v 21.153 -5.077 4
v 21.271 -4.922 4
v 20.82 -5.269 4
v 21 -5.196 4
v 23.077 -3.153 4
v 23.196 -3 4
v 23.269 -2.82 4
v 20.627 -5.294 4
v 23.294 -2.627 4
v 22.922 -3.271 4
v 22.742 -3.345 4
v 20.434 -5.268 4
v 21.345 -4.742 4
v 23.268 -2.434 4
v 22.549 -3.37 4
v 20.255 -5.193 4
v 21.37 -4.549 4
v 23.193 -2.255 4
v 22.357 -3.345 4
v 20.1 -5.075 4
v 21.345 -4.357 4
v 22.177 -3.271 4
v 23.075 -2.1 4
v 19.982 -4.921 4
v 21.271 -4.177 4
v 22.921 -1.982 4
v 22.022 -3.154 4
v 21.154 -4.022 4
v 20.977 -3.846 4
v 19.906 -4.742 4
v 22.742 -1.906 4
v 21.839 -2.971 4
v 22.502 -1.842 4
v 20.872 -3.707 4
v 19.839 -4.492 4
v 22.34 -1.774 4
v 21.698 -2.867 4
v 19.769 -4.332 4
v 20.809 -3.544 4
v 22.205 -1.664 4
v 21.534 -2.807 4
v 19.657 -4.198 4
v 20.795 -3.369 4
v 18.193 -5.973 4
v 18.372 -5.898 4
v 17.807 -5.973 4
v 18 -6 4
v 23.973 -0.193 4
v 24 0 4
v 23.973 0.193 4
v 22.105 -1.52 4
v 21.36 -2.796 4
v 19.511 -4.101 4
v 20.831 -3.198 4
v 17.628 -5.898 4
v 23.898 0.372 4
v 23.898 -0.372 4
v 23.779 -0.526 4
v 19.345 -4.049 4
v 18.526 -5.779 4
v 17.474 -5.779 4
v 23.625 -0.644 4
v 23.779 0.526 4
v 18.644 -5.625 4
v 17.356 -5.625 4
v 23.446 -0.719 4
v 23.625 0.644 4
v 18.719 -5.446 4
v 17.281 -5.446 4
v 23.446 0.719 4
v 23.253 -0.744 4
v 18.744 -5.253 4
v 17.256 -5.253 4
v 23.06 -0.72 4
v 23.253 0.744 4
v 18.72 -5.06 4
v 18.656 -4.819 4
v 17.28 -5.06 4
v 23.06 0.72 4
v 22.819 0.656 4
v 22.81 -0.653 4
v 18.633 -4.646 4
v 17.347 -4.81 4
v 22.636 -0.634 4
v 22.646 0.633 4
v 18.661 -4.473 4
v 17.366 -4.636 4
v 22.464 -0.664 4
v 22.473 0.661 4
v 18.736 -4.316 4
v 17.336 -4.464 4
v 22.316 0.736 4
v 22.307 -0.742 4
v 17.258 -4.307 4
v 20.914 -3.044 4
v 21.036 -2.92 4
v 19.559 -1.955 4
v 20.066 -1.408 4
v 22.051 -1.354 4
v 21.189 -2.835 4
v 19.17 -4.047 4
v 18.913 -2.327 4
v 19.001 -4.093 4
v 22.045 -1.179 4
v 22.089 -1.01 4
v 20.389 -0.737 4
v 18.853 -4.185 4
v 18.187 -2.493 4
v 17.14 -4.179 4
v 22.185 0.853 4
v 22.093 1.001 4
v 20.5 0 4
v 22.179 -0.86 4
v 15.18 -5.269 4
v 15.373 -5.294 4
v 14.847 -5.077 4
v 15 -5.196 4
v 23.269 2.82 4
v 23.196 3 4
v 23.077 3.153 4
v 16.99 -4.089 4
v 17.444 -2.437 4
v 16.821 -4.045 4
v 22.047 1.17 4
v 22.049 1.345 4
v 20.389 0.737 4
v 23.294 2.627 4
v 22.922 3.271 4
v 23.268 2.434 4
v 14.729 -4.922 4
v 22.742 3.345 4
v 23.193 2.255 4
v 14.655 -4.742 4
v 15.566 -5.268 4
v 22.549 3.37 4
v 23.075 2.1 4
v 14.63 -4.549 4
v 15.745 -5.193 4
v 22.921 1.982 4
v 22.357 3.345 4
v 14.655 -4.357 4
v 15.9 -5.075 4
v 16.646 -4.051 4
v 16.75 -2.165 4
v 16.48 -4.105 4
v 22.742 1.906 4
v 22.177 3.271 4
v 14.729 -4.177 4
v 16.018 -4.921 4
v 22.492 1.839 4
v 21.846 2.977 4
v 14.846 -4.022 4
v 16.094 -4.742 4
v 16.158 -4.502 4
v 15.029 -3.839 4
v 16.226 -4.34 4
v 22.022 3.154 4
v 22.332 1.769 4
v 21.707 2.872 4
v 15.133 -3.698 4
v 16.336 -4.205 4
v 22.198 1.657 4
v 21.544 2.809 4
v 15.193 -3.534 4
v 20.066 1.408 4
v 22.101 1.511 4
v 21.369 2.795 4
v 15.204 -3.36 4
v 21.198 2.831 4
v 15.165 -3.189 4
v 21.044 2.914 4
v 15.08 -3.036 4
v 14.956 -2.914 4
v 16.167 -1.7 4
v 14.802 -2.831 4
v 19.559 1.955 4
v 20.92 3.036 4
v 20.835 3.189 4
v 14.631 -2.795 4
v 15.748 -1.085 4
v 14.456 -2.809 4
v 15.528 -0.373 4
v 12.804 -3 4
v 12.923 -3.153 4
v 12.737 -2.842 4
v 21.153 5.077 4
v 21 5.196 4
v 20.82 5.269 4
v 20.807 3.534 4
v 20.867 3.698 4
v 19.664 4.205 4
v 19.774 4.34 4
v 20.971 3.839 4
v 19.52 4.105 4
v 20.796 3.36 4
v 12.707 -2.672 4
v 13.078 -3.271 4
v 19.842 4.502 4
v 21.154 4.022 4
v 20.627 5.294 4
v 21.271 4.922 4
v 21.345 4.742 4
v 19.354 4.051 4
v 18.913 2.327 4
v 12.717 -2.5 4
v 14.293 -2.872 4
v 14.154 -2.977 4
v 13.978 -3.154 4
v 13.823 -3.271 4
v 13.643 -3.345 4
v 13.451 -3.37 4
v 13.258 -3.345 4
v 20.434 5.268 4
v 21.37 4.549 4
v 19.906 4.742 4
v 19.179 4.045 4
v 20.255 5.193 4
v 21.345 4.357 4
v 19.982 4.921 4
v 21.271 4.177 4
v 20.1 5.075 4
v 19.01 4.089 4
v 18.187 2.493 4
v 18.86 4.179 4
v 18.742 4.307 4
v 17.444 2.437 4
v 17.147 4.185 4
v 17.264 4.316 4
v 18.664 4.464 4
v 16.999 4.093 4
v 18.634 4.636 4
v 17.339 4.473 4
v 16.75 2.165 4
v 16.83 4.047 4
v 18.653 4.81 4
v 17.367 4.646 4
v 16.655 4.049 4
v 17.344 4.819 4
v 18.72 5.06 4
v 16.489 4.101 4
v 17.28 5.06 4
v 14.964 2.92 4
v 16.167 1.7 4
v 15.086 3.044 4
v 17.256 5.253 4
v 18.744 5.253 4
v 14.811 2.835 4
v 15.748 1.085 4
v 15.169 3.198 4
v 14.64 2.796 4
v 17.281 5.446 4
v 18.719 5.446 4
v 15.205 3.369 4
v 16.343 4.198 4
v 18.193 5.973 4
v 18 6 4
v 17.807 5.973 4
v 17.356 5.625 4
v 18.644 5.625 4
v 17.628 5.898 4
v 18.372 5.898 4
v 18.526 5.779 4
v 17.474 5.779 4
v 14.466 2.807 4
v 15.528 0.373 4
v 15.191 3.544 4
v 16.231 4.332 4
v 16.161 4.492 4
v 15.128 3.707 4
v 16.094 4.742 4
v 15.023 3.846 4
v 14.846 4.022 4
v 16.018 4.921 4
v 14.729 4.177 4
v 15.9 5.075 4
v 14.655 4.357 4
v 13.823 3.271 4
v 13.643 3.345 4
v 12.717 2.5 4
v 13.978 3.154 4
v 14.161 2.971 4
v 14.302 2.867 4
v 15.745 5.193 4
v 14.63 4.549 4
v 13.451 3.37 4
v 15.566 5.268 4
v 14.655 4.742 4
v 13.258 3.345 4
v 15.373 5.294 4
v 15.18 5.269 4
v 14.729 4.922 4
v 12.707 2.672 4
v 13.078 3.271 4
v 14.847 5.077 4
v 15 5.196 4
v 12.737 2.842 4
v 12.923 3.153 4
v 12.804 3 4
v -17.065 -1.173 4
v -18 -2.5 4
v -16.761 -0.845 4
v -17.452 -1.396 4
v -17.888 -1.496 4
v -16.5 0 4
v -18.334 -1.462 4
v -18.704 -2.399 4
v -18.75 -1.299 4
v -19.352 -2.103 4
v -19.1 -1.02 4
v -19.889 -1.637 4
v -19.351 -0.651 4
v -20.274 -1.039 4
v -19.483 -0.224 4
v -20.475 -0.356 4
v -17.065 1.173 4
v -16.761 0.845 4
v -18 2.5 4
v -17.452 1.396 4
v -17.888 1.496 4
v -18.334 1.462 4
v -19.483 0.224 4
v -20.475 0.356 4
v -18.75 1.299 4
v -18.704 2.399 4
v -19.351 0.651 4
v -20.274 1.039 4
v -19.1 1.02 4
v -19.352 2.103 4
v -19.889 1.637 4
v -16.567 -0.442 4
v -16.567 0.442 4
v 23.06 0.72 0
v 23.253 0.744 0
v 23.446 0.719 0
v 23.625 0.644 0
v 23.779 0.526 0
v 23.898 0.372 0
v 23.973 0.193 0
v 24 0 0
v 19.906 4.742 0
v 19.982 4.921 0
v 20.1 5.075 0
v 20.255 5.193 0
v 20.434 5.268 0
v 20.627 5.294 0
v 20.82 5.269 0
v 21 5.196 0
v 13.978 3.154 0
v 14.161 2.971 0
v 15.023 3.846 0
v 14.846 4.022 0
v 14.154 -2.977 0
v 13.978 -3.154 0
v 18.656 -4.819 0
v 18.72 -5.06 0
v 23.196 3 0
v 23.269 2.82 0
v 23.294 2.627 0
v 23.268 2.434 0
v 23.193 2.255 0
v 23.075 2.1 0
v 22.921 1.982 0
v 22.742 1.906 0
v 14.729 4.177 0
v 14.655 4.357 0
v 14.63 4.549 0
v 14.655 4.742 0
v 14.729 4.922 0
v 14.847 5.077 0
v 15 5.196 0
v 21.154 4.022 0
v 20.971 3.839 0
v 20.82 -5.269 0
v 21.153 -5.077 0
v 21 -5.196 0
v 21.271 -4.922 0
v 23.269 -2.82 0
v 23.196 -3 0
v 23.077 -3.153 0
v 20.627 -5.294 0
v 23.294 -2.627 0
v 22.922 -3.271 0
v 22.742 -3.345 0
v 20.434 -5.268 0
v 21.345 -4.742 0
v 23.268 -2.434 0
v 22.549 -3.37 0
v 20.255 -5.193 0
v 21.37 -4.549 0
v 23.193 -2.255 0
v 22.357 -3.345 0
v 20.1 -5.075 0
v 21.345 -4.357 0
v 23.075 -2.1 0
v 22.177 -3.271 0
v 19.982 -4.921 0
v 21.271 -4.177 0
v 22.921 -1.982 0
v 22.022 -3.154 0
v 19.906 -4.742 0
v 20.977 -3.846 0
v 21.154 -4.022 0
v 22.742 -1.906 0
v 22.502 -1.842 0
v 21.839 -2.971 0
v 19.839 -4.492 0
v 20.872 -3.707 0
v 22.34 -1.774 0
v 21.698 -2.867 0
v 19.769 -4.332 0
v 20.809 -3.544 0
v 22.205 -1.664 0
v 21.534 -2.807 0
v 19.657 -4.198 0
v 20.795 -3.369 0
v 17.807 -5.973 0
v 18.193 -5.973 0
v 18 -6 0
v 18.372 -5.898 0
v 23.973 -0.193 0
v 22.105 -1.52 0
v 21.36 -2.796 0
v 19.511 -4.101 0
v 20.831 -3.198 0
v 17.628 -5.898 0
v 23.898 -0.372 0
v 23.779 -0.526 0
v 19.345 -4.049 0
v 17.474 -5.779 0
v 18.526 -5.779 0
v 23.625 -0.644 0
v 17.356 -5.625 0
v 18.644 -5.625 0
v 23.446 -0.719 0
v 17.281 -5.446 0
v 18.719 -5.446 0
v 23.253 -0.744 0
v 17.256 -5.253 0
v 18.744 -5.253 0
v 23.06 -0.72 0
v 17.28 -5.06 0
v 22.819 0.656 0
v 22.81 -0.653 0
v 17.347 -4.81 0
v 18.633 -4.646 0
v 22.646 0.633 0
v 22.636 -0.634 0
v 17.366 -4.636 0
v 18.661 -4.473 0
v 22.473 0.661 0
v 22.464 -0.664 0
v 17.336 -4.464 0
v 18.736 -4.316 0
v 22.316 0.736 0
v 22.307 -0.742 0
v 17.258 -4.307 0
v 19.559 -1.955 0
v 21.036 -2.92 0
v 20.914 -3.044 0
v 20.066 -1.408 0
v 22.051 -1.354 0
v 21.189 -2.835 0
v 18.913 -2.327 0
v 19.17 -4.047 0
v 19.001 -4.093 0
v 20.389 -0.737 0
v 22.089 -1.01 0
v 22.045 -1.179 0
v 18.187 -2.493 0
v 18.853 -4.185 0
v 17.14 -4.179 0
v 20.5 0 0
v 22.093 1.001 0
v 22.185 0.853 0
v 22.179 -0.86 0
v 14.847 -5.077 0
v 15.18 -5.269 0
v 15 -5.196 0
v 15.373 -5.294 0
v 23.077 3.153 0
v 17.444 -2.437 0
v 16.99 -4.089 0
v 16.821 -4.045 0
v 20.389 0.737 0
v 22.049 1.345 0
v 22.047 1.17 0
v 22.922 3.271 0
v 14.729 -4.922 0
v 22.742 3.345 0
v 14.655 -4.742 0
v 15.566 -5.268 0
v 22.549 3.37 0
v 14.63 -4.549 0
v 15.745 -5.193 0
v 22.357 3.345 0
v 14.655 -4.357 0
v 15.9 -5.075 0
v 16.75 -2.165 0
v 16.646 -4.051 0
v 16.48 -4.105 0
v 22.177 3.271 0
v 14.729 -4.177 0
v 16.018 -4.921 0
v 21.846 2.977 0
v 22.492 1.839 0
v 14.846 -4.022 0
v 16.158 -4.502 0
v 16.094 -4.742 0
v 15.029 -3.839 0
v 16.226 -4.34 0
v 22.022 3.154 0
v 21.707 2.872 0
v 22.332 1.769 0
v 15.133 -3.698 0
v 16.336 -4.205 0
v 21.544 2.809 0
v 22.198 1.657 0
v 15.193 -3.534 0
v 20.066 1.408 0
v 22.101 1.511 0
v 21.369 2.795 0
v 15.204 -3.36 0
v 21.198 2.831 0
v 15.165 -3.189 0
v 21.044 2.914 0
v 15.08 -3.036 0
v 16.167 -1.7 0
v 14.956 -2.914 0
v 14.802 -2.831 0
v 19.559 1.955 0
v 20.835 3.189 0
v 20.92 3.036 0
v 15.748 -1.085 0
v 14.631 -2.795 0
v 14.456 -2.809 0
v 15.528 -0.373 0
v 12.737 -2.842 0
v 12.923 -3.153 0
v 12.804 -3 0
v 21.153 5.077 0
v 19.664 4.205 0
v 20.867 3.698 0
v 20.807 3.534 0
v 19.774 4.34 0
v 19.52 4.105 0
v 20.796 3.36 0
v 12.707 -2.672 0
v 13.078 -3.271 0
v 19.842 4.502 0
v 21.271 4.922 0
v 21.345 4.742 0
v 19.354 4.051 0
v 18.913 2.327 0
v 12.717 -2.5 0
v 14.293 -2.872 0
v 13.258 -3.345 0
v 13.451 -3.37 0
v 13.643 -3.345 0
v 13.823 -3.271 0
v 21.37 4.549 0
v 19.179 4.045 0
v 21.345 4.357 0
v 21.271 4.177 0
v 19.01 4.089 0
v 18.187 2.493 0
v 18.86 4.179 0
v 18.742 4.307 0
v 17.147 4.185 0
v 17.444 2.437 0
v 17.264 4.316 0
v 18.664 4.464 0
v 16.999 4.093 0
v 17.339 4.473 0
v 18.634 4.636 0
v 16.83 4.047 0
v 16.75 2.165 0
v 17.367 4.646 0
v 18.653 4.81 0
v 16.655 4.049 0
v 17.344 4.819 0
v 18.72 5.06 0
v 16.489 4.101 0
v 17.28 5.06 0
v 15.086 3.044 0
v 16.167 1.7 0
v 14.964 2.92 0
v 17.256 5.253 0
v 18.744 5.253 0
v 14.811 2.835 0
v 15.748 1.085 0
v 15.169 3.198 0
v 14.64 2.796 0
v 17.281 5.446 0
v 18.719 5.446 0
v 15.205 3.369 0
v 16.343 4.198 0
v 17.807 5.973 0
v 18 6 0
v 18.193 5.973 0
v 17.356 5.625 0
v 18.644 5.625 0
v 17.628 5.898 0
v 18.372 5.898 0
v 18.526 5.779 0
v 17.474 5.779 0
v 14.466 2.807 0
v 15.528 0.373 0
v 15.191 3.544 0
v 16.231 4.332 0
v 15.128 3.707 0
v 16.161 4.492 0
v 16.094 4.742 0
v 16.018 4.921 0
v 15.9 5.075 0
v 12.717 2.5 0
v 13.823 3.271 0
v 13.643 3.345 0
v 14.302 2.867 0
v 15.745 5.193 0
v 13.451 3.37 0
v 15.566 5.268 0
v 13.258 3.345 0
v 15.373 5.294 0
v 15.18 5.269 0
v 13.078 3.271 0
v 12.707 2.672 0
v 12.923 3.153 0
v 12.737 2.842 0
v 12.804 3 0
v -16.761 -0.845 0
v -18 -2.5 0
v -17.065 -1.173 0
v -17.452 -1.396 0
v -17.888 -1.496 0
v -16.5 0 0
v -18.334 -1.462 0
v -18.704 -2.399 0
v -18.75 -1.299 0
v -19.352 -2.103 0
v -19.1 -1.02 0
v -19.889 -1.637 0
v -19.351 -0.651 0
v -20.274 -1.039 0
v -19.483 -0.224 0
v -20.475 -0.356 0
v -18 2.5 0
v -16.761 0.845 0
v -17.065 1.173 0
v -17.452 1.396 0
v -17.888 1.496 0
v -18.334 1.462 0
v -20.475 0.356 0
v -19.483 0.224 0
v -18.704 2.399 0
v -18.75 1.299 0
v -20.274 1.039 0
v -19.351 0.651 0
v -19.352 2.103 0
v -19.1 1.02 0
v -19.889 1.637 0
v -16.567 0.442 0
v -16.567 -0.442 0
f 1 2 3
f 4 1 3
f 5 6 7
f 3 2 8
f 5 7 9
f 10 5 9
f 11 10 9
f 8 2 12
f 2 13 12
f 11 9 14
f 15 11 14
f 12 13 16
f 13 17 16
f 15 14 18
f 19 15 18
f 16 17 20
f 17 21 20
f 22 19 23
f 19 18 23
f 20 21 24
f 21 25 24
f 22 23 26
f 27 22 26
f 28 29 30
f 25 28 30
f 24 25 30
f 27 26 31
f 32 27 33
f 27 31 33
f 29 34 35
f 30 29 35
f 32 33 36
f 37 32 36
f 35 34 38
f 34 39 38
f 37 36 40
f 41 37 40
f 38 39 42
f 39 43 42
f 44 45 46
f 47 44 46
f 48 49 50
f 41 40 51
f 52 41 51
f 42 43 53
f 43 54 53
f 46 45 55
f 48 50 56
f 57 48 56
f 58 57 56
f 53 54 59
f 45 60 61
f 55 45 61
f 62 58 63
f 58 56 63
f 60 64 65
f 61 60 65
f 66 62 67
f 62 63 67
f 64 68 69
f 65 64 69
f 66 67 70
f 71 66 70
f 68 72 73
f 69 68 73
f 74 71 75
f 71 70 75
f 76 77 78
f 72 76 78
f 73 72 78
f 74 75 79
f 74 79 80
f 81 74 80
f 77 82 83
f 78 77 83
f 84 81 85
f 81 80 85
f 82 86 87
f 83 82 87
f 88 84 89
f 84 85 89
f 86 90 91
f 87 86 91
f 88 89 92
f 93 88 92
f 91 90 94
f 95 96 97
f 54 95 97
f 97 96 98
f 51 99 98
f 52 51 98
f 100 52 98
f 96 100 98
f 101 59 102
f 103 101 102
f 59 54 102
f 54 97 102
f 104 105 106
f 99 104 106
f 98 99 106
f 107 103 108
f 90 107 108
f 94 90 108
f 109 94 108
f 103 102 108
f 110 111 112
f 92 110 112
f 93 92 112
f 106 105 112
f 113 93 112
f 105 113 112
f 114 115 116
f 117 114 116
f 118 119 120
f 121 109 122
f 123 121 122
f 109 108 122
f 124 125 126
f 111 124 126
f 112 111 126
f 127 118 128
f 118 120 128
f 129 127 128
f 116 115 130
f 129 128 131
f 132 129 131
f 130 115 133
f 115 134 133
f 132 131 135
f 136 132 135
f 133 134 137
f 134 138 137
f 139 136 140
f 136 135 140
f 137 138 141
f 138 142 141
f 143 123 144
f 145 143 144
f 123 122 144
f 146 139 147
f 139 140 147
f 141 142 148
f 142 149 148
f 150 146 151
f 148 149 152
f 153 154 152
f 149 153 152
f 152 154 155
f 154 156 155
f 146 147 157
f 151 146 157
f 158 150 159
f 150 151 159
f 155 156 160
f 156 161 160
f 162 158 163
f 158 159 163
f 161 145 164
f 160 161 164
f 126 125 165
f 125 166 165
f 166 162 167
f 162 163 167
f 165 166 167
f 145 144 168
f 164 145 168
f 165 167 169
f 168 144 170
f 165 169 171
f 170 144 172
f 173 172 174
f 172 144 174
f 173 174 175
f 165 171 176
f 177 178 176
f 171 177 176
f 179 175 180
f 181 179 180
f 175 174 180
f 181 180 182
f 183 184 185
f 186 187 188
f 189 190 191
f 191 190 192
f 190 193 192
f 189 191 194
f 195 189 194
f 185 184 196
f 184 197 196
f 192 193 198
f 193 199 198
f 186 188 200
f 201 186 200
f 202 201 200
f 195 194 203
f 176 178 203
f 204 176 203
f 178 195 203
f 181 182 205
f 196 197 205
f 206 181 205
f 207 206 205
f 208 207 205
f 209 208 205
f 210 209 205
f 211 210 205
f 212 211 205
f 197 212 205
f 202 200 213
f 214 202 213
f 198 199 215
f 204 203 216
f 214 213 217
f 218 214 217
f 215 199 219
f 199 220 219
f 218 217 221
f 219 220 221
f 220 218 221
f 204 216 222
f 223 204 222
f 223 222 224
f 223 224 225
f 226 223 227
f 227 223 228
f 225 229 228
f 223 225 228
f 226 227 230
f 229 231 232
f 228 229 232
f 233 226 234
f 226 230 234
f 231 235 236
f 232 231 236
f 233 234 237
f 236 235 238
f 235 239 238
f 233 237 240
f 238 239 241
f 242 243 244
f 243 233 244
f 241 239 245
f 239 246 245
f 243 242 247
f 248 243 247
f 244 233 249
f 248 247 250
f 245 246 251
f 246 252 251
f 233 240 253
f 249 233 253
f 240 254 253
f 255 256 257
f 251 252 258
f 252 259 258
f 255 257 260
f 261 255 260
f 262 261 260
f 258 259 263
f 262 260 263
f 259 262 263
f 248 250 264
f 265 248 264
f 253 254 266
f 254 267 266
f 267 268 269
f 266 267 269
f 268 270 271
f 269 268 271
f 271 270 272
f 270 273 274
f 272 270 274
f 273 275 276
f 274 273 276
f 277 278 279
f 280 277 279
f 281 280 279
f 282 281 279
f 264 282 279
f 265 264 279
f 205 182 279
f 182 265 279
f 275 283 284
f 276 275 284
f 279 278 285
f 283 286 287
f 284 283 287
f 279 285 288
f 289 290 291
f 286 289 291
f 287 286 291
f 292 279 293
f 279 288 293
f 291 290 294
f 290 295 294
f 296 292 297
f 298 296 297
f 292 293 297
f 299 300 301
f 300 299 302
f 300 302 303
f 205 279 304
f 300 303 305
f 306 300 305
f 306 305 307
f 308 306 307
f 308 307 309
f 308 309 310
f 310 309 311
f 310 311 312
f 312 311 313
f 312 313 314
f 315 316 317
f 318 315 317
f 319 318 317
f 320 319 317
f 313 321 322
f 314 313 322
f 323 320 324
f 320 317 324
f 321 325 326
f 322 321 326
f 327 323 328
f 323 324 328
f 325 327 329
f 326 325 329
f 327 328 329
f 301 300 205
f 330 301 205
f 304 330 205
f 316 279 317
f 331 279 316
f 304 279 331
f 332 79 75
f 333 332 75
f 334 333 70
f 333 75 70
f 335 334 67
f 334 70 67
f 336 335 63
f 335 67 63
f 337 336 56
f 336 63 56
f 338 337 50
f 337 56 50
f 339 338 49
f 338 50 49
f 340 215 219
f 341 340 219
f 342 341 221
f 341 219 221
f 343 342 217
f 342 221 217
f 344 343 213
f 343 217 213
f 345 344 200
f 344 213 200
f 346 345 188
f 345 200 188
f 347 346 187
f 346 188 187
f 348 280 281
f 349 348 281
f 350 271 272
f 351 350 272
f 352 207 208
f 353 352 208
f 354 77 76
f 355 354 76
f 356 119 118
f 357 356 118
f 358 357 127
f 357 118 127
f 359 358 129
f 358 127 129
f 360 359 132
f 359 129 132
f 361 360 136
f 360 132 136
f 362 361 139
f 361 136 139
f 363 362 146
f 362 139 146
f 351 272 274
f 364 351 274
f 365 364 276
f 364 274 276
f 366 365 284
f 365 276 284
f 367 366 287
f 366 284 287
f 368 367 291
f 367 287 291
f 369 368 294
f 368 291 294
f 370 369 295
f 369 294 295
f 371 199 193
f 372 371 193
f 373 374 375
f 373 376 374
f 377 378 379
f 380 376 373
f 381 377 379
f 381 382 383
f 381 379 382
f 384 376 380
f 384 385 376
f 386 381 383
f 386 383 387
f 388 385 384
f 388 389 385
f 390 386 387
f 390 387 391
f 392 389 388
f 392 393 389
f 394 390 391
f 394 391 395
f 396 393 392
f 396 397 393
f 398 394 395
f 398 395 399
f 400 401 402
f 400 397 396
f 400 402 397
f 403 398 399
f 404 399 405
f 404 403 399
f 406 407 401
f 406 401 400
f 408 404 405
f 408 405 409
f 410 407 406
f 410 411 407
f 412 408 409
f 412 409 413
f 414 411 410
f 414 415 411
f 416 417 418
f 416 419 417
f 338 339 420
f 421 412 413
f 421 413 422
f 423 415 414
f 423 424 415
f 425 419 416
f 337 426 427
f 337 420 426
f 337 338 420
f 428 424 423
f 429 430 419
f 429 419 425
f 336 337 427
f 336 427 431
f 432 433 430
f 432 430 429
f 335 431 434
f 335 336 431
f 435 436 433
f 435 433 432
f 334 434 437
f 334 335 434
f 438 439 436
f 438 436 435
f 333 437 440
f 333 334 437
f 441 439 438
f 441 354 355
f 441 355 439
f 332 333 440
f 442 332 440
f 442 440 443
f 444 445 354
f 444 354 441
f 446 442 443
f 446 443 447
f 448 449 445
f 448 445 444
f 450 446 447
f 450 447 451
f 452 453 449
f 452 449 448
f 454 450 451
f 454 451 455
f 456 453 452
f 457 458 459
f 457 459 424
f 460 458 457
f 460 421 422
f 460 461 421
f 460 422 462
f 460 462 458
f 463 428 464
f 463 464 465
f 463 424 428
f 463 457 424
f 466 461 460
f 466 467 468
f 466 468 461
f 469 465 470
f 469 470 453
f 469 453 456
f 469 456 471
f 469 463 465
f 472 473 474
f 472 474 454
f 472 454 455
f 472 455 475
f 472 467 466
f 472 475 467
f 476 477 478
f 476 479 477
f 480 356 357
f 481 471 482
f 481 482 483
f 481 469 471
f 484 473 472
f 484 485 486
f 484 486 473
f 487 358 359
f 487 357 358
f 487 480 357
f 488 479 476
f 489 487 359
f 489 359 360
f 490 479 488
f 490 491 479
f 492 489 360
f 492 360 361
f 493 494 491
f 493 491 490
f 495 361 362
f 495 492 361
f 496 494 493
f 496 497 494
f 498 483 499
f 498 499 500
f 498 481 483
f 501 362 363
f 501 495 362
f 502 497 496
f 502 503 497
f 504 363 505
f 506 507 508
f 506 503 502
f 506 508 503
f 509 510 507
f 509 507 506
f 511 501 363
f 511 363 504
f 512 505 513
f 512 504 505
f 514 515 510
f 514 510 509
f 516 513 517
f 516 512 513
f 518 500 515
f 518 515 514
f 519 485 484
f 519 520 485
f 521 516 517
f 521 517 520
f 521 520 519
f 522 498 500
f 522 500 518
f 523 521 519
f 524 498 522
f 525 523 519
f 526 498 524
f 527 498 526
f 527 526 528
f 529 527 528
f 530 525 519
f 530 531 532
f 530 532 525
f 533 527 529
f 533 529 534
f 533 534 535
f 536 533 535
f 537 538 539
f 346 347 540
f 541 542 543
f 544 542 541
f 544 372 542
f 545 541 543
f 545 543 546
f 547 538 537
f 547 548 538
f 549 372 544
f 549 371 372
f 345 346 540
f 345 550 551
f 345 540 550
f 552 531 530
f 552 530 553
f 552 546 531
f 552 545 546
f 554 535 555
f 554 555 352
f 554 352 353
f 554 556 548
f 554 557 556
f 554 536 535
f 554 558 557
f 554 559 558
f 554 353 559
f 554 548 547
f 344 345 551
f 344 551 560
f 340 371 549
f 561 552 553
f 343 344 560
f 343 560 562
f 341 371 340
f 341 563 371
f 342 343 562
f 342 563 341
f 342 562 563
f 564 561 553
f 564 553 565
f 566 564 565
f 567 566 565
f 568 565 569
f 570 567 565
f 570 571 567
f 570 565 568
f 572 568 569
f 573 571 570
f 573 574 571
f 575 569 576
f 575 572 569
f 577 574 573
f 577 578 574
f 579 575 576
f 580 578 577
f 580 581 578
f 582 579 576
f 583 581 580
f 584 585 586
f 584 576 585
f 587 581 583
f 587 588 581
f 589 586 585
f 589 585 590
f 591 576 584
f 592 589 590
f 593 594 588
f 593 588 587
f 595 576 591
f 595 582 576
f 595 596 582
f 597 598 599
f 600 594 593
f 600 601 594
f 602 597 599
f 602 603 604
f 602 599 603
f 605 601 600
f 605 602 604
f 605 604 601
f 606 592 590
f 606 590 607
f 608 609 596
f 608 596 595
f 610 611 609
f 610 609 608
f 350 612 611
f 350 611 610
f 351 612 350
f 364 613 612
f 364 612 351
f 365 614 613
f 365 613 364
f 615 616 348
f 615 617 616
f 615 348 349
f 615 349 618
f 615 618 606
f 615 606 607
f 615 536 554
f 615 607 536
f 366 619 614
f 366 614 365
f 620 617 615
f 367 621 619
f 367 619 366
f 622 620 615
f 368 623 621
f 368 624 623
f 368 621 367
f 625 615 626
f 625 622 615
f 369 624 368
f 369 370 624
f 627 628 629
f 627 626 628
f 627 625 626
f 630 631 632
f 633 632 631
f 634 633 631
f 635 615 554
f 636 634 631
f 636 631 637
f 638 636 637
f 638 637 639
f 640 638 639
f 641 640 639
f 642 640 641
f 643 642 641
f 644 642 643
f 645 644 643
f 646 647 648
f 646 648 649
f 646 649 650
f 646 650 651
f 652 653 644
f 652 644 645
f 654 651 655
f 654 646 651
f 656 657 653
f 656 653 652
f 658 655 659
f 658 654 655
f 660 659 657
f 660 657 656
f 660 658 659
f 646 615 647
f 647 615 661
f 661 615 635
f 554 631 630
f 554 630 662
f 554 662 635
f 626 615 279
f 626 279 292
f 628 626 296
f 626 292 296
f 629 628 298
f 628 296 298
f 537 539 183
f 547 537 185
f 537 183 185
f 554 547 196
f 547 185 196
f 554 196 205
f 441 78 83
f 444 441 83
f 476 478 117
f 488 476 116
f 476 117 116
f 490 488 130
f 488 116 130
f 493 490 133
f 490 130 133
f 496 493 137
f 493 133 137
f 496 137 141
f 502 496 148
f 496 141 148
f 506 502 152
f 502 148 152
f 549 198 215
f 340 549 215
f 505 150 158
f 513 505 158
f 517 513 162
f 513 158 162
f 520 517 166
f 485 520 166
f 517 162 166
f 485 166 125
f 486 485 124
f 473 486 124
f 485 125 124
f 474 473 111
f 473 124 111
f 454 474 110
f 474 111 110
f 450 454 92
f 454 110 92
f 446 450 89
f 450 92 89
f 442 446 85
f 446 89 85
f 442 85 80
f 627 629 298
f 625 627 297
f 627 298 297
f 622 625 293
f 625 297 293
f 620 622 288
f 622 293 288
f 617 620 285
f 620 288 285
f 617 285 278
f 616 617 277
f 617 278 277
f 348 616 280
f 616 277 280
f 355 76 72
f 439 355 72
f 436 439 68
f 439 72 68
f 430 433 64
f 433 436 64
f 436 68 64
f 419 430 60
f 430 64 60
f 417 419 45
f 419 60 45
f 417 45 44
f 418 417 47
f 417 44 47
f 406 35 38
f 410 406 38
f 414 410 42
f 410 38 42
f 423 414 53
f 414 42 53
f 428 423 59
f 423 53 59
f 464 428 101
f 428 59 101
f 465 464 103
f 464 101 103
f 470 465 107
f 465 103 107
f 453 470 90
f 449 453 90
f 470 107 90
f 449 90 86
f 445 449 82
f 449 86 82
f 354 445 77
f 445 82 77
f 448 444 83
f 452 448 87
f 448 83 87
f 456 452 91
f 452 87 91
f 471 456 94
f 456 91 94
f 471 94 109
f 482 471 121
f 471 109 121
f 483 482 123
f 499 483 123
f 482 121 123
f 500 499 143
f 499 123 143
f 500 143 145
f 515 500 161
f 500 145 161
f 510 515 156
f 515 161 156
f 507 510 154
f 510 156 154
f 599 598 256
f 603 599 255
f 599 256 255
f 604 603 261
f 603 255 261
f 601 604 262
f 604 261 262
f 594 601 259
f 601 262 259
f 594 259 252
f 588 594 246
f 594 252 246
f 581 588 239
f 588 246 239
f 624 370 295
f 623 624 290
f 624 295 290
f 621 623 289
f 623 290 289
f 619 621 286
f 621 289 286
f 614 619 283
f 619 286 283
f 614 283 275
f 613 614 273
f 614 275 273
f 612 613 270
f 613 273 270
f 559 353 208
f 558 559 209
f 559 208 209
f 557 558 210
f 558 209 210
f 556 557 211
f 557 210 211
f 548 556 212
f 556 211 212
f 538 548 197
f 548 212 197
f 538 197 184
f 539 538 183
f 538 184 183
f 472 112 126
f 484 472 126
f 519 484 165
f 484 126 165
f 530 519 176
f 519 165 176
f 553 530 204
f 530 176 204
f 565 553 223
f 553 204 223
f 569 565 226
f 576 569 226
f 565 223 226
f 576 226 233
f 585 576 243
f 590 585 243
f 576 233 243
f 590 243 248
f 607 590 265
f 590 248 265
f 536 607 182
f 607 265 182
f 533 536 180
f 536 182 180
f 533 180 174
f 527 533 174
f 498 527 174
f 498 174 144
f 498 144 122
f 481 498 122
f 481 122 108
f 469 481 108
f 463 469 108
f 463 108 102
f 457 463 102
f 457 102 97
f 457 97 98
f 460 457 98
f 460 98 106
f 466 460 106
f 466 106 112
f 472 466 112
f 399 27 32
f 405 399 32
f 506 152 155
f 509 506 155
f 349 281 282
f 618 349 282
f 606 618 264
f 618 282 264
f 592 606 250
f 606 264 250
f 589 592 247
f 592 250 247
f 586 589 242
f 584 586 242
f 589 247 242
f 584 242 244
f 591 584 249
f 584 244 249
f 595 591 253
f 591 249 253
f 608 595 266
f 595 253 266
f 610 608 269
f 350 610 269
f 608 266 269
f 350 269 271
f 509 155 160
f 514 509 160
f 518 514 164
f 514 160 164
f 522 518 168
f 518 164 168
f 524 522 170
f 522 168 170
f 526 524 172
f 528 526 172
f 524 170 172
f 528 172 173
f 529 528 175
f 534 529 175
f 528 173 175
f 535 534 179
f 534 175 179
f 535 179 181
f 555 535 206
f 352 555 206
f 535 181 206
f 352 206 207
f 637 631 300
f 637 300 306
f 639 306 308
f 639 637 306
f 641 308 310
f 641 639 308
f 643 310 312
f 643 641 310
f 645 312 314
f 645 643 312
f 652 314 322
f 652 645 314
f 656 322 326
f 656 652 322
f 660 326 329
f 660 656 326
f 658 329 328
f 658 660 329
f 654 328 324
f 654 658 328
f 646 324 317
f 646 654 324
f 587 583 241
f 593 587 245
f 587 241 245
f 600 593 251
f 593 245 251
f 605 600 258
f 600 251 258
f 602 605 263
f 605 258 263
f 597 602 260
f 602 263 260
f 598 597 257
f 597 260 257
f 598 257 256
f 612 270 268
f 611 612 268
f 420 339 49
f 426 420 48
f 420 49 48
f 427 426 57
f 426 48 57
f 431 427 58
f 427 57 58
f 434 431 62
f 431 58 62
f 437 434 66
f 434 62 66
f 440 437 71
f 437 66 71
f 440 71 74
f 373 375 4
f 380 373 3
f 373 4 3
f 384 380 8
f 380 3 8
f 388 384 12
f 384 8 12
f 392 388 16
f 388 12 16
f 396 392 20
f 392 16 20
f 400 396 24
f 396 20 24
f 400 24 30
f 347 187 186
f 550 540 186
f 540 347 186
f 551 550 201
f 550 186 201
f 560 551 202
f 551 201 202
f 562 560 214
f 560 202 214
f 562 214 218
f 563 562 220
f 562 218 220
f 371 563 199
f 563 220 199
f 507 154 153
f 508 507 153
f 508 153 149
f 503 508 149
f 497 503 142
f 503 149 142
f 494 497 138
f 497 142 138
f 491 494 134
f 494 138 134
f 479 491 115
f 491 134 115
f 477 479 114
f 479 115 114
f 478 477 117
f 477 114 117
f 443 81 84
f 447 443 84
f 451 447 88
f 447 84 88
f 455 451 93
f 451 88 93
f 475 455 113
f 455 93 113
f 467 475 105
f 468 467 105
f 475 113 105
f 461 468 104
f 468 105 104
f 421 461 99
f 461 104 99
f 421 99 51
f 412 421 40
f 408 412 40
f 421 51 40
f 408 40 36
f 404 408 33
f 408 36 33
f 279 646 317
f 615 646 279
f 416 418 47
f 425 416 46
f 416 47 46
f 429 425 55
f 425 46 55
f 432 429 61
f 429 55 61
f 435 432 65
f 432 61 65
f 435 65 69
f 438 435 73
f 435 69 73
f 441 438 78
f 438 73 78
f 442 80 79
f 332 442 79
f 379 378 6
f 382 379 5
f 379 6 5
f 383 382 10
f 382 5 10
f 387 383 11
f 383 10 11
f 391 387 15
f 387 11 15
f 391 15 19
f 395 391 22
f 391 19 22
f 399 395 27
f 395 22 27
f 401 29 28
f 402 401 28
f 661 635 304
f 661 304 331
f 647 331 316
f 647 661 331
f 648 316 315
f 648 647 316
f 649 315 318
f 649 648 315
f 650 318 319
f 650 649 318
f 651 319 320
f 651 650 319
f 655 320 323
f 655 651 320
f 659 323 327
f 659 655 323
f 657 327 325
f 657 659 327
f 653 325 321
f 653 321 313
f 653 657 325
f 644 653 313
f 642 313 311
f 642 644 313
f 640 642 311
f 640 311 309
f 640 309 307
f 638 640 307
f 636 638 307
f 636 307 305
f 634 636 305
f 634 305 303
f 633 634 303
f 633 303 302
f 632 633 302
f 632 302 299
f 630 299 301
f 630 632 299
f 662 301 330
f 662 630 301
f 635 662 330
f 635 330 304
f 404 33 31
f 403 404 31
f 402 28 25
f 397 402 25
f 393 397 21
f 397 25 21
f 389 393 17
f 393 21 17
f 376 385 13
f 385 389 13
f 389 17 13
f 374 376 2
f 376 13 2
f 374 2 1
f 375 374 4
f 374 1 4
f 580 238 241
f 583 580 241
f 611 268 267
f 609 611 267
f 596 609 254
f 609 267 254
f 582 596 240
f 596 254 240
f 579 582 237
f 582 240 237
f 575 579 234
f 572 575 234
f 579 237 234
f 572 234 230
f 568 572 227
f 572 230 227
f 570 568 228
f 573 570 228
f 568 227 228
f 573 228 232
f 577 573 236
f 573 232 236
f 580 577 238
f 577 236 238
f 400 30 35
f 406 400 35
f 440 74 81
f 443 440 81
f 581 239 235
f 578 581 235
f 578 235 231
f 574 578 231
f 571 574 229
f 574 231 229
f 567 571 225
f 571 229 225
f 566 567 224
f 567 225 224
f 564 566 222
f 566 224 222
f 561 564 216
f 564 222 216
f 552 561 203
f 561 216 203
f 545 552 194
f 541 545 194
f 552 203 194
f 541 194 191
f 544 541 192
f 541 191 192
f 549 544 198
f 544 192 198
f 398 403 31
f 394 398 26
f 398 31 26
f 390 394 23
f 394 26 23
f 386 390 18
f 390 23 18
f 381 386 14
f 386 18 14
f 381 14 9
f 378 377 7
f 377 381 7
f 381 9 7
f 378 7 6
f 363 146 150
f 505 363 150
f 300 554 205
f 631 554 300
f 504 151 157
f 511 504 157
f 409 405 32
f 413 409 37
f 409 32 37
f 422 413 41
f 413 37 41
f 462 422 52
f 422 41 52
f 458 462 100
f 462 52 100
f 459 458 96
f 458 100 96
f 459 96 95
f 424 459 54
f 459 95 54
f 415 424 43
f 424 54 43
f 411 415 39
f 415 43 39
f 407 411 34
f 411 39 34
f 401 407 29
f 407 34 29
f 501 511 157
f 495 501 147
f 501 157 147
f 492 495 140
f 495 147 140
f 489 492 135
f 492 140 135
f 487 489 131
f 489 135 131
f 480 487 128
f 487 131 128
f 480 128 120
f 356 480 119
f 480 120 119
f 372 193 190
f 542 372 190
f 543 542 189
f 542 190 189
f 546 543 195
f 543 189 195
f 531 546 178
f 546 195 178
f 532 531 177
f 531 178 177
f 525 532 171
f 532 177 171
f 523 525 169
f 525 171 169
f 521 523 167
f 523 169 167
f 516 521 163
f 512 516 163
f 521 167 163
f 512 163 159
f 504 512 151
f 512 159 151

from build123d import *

# Parameters (mm, degrees)
SKETCH1_R           = 1.5
BOSS_EXTRUDE1_DEPTH = 4
CUT_EXTRUDE2_DEPTH  = 5
CIRPATTERN1_COUNT   = 12
SKETCH3_W           = 7.863082298
SKETCH3_H           = 5
BOSS_EXTRUDE2_DEPTH = 4
SKETCH4_R           = 2.5
CUT_EXTRUDE3_DEPTH  = 5


with BuildPart() as part:
    # Sketch1 → Boss-Extrude1 (new body)
    with BuildSketch(Plane.XY):
        with BuildLine():
            Line((-18, 2.5), (12.545643943, 2.5))
            ThreePointArc((12.545643943, 2.5), (24, 0), (12.545643943, -2.5))
            Line((12.545643943, -2.5), (-18, -2.5))
            ThreePointArc((-18, -2.5), (-20.5, 0), (-18, 2.5))
        make_face()
        with Locations((-18, 0)):
            Circle(SKETCH1_R, mode=Mode.SUBTRACT)
    extrude(amount=BOSS_EXTRUDE1_DEPTH)

    # Sketch2 → Cut-Extrude2 (cut, through all)
    with BuildSketch(Plane.XY.offset(4)):
        with BuildLine():
            Line((18.72, 5.06), (18.653012702, 4.81))
            ThreePointArc((18.653012702, 4.81), (19.09327028, 4.061267387), (19.842002893, 4.501524965))
            Line((19.842002893, 4.501524965), (19.906461709, 4.742088543))
            ThreePointArc((19.906461709, 4.742088543), (20.342188248, 5.236548367), (21, 5.196152423))
            ThreePointArc((21, 5.196152423), (19.615923505, 6.030708621), (18, 6))
            ThreePointArc((18, 6), (18.589879661, 5.706078038), (18.72, 5.06))
        make_face()
    cut_extrude2 = extrude(amount=-CUT_EXTRUDE2_DEPTH, mode=Mode.SUBTRACT)

    # CirPattern1: Cut-Extrude2 ×12 about axis
    cirpattern1_axis = Axis((18, 0, 0), (0, 0, 1))
    for i in range(1, CIRPATTERN1_COUNT):
        add(cut_extrude2.rotate(cirpattern1_axis, i * 360 / CIRPATTERN1_COUNT), mode=Mode.SUBTRACT)

    # Sketch3 → Boss-Extrude2 (add)
    with BuildSketch(Plane.XY.offset(4)):
        with Locations((12.029323846, 0)):
            Rectangle(SKETCH3_W, SKETCH3_H)
    extrude(amount=-BOSS_EXTRUDE2_DEPTH)

    # Sketch4 → Cut-Extrude3 (cut, through all)
    with BuildSketch(Plane.XY.offset(4)):
        with Locations((18, 0)):
            Circle(SKETCH4_R)
    extrude(amount=-CUT_EXTRUDE3_DEPTH, mode=Mode.SUBTRACT)


solid = part.part
